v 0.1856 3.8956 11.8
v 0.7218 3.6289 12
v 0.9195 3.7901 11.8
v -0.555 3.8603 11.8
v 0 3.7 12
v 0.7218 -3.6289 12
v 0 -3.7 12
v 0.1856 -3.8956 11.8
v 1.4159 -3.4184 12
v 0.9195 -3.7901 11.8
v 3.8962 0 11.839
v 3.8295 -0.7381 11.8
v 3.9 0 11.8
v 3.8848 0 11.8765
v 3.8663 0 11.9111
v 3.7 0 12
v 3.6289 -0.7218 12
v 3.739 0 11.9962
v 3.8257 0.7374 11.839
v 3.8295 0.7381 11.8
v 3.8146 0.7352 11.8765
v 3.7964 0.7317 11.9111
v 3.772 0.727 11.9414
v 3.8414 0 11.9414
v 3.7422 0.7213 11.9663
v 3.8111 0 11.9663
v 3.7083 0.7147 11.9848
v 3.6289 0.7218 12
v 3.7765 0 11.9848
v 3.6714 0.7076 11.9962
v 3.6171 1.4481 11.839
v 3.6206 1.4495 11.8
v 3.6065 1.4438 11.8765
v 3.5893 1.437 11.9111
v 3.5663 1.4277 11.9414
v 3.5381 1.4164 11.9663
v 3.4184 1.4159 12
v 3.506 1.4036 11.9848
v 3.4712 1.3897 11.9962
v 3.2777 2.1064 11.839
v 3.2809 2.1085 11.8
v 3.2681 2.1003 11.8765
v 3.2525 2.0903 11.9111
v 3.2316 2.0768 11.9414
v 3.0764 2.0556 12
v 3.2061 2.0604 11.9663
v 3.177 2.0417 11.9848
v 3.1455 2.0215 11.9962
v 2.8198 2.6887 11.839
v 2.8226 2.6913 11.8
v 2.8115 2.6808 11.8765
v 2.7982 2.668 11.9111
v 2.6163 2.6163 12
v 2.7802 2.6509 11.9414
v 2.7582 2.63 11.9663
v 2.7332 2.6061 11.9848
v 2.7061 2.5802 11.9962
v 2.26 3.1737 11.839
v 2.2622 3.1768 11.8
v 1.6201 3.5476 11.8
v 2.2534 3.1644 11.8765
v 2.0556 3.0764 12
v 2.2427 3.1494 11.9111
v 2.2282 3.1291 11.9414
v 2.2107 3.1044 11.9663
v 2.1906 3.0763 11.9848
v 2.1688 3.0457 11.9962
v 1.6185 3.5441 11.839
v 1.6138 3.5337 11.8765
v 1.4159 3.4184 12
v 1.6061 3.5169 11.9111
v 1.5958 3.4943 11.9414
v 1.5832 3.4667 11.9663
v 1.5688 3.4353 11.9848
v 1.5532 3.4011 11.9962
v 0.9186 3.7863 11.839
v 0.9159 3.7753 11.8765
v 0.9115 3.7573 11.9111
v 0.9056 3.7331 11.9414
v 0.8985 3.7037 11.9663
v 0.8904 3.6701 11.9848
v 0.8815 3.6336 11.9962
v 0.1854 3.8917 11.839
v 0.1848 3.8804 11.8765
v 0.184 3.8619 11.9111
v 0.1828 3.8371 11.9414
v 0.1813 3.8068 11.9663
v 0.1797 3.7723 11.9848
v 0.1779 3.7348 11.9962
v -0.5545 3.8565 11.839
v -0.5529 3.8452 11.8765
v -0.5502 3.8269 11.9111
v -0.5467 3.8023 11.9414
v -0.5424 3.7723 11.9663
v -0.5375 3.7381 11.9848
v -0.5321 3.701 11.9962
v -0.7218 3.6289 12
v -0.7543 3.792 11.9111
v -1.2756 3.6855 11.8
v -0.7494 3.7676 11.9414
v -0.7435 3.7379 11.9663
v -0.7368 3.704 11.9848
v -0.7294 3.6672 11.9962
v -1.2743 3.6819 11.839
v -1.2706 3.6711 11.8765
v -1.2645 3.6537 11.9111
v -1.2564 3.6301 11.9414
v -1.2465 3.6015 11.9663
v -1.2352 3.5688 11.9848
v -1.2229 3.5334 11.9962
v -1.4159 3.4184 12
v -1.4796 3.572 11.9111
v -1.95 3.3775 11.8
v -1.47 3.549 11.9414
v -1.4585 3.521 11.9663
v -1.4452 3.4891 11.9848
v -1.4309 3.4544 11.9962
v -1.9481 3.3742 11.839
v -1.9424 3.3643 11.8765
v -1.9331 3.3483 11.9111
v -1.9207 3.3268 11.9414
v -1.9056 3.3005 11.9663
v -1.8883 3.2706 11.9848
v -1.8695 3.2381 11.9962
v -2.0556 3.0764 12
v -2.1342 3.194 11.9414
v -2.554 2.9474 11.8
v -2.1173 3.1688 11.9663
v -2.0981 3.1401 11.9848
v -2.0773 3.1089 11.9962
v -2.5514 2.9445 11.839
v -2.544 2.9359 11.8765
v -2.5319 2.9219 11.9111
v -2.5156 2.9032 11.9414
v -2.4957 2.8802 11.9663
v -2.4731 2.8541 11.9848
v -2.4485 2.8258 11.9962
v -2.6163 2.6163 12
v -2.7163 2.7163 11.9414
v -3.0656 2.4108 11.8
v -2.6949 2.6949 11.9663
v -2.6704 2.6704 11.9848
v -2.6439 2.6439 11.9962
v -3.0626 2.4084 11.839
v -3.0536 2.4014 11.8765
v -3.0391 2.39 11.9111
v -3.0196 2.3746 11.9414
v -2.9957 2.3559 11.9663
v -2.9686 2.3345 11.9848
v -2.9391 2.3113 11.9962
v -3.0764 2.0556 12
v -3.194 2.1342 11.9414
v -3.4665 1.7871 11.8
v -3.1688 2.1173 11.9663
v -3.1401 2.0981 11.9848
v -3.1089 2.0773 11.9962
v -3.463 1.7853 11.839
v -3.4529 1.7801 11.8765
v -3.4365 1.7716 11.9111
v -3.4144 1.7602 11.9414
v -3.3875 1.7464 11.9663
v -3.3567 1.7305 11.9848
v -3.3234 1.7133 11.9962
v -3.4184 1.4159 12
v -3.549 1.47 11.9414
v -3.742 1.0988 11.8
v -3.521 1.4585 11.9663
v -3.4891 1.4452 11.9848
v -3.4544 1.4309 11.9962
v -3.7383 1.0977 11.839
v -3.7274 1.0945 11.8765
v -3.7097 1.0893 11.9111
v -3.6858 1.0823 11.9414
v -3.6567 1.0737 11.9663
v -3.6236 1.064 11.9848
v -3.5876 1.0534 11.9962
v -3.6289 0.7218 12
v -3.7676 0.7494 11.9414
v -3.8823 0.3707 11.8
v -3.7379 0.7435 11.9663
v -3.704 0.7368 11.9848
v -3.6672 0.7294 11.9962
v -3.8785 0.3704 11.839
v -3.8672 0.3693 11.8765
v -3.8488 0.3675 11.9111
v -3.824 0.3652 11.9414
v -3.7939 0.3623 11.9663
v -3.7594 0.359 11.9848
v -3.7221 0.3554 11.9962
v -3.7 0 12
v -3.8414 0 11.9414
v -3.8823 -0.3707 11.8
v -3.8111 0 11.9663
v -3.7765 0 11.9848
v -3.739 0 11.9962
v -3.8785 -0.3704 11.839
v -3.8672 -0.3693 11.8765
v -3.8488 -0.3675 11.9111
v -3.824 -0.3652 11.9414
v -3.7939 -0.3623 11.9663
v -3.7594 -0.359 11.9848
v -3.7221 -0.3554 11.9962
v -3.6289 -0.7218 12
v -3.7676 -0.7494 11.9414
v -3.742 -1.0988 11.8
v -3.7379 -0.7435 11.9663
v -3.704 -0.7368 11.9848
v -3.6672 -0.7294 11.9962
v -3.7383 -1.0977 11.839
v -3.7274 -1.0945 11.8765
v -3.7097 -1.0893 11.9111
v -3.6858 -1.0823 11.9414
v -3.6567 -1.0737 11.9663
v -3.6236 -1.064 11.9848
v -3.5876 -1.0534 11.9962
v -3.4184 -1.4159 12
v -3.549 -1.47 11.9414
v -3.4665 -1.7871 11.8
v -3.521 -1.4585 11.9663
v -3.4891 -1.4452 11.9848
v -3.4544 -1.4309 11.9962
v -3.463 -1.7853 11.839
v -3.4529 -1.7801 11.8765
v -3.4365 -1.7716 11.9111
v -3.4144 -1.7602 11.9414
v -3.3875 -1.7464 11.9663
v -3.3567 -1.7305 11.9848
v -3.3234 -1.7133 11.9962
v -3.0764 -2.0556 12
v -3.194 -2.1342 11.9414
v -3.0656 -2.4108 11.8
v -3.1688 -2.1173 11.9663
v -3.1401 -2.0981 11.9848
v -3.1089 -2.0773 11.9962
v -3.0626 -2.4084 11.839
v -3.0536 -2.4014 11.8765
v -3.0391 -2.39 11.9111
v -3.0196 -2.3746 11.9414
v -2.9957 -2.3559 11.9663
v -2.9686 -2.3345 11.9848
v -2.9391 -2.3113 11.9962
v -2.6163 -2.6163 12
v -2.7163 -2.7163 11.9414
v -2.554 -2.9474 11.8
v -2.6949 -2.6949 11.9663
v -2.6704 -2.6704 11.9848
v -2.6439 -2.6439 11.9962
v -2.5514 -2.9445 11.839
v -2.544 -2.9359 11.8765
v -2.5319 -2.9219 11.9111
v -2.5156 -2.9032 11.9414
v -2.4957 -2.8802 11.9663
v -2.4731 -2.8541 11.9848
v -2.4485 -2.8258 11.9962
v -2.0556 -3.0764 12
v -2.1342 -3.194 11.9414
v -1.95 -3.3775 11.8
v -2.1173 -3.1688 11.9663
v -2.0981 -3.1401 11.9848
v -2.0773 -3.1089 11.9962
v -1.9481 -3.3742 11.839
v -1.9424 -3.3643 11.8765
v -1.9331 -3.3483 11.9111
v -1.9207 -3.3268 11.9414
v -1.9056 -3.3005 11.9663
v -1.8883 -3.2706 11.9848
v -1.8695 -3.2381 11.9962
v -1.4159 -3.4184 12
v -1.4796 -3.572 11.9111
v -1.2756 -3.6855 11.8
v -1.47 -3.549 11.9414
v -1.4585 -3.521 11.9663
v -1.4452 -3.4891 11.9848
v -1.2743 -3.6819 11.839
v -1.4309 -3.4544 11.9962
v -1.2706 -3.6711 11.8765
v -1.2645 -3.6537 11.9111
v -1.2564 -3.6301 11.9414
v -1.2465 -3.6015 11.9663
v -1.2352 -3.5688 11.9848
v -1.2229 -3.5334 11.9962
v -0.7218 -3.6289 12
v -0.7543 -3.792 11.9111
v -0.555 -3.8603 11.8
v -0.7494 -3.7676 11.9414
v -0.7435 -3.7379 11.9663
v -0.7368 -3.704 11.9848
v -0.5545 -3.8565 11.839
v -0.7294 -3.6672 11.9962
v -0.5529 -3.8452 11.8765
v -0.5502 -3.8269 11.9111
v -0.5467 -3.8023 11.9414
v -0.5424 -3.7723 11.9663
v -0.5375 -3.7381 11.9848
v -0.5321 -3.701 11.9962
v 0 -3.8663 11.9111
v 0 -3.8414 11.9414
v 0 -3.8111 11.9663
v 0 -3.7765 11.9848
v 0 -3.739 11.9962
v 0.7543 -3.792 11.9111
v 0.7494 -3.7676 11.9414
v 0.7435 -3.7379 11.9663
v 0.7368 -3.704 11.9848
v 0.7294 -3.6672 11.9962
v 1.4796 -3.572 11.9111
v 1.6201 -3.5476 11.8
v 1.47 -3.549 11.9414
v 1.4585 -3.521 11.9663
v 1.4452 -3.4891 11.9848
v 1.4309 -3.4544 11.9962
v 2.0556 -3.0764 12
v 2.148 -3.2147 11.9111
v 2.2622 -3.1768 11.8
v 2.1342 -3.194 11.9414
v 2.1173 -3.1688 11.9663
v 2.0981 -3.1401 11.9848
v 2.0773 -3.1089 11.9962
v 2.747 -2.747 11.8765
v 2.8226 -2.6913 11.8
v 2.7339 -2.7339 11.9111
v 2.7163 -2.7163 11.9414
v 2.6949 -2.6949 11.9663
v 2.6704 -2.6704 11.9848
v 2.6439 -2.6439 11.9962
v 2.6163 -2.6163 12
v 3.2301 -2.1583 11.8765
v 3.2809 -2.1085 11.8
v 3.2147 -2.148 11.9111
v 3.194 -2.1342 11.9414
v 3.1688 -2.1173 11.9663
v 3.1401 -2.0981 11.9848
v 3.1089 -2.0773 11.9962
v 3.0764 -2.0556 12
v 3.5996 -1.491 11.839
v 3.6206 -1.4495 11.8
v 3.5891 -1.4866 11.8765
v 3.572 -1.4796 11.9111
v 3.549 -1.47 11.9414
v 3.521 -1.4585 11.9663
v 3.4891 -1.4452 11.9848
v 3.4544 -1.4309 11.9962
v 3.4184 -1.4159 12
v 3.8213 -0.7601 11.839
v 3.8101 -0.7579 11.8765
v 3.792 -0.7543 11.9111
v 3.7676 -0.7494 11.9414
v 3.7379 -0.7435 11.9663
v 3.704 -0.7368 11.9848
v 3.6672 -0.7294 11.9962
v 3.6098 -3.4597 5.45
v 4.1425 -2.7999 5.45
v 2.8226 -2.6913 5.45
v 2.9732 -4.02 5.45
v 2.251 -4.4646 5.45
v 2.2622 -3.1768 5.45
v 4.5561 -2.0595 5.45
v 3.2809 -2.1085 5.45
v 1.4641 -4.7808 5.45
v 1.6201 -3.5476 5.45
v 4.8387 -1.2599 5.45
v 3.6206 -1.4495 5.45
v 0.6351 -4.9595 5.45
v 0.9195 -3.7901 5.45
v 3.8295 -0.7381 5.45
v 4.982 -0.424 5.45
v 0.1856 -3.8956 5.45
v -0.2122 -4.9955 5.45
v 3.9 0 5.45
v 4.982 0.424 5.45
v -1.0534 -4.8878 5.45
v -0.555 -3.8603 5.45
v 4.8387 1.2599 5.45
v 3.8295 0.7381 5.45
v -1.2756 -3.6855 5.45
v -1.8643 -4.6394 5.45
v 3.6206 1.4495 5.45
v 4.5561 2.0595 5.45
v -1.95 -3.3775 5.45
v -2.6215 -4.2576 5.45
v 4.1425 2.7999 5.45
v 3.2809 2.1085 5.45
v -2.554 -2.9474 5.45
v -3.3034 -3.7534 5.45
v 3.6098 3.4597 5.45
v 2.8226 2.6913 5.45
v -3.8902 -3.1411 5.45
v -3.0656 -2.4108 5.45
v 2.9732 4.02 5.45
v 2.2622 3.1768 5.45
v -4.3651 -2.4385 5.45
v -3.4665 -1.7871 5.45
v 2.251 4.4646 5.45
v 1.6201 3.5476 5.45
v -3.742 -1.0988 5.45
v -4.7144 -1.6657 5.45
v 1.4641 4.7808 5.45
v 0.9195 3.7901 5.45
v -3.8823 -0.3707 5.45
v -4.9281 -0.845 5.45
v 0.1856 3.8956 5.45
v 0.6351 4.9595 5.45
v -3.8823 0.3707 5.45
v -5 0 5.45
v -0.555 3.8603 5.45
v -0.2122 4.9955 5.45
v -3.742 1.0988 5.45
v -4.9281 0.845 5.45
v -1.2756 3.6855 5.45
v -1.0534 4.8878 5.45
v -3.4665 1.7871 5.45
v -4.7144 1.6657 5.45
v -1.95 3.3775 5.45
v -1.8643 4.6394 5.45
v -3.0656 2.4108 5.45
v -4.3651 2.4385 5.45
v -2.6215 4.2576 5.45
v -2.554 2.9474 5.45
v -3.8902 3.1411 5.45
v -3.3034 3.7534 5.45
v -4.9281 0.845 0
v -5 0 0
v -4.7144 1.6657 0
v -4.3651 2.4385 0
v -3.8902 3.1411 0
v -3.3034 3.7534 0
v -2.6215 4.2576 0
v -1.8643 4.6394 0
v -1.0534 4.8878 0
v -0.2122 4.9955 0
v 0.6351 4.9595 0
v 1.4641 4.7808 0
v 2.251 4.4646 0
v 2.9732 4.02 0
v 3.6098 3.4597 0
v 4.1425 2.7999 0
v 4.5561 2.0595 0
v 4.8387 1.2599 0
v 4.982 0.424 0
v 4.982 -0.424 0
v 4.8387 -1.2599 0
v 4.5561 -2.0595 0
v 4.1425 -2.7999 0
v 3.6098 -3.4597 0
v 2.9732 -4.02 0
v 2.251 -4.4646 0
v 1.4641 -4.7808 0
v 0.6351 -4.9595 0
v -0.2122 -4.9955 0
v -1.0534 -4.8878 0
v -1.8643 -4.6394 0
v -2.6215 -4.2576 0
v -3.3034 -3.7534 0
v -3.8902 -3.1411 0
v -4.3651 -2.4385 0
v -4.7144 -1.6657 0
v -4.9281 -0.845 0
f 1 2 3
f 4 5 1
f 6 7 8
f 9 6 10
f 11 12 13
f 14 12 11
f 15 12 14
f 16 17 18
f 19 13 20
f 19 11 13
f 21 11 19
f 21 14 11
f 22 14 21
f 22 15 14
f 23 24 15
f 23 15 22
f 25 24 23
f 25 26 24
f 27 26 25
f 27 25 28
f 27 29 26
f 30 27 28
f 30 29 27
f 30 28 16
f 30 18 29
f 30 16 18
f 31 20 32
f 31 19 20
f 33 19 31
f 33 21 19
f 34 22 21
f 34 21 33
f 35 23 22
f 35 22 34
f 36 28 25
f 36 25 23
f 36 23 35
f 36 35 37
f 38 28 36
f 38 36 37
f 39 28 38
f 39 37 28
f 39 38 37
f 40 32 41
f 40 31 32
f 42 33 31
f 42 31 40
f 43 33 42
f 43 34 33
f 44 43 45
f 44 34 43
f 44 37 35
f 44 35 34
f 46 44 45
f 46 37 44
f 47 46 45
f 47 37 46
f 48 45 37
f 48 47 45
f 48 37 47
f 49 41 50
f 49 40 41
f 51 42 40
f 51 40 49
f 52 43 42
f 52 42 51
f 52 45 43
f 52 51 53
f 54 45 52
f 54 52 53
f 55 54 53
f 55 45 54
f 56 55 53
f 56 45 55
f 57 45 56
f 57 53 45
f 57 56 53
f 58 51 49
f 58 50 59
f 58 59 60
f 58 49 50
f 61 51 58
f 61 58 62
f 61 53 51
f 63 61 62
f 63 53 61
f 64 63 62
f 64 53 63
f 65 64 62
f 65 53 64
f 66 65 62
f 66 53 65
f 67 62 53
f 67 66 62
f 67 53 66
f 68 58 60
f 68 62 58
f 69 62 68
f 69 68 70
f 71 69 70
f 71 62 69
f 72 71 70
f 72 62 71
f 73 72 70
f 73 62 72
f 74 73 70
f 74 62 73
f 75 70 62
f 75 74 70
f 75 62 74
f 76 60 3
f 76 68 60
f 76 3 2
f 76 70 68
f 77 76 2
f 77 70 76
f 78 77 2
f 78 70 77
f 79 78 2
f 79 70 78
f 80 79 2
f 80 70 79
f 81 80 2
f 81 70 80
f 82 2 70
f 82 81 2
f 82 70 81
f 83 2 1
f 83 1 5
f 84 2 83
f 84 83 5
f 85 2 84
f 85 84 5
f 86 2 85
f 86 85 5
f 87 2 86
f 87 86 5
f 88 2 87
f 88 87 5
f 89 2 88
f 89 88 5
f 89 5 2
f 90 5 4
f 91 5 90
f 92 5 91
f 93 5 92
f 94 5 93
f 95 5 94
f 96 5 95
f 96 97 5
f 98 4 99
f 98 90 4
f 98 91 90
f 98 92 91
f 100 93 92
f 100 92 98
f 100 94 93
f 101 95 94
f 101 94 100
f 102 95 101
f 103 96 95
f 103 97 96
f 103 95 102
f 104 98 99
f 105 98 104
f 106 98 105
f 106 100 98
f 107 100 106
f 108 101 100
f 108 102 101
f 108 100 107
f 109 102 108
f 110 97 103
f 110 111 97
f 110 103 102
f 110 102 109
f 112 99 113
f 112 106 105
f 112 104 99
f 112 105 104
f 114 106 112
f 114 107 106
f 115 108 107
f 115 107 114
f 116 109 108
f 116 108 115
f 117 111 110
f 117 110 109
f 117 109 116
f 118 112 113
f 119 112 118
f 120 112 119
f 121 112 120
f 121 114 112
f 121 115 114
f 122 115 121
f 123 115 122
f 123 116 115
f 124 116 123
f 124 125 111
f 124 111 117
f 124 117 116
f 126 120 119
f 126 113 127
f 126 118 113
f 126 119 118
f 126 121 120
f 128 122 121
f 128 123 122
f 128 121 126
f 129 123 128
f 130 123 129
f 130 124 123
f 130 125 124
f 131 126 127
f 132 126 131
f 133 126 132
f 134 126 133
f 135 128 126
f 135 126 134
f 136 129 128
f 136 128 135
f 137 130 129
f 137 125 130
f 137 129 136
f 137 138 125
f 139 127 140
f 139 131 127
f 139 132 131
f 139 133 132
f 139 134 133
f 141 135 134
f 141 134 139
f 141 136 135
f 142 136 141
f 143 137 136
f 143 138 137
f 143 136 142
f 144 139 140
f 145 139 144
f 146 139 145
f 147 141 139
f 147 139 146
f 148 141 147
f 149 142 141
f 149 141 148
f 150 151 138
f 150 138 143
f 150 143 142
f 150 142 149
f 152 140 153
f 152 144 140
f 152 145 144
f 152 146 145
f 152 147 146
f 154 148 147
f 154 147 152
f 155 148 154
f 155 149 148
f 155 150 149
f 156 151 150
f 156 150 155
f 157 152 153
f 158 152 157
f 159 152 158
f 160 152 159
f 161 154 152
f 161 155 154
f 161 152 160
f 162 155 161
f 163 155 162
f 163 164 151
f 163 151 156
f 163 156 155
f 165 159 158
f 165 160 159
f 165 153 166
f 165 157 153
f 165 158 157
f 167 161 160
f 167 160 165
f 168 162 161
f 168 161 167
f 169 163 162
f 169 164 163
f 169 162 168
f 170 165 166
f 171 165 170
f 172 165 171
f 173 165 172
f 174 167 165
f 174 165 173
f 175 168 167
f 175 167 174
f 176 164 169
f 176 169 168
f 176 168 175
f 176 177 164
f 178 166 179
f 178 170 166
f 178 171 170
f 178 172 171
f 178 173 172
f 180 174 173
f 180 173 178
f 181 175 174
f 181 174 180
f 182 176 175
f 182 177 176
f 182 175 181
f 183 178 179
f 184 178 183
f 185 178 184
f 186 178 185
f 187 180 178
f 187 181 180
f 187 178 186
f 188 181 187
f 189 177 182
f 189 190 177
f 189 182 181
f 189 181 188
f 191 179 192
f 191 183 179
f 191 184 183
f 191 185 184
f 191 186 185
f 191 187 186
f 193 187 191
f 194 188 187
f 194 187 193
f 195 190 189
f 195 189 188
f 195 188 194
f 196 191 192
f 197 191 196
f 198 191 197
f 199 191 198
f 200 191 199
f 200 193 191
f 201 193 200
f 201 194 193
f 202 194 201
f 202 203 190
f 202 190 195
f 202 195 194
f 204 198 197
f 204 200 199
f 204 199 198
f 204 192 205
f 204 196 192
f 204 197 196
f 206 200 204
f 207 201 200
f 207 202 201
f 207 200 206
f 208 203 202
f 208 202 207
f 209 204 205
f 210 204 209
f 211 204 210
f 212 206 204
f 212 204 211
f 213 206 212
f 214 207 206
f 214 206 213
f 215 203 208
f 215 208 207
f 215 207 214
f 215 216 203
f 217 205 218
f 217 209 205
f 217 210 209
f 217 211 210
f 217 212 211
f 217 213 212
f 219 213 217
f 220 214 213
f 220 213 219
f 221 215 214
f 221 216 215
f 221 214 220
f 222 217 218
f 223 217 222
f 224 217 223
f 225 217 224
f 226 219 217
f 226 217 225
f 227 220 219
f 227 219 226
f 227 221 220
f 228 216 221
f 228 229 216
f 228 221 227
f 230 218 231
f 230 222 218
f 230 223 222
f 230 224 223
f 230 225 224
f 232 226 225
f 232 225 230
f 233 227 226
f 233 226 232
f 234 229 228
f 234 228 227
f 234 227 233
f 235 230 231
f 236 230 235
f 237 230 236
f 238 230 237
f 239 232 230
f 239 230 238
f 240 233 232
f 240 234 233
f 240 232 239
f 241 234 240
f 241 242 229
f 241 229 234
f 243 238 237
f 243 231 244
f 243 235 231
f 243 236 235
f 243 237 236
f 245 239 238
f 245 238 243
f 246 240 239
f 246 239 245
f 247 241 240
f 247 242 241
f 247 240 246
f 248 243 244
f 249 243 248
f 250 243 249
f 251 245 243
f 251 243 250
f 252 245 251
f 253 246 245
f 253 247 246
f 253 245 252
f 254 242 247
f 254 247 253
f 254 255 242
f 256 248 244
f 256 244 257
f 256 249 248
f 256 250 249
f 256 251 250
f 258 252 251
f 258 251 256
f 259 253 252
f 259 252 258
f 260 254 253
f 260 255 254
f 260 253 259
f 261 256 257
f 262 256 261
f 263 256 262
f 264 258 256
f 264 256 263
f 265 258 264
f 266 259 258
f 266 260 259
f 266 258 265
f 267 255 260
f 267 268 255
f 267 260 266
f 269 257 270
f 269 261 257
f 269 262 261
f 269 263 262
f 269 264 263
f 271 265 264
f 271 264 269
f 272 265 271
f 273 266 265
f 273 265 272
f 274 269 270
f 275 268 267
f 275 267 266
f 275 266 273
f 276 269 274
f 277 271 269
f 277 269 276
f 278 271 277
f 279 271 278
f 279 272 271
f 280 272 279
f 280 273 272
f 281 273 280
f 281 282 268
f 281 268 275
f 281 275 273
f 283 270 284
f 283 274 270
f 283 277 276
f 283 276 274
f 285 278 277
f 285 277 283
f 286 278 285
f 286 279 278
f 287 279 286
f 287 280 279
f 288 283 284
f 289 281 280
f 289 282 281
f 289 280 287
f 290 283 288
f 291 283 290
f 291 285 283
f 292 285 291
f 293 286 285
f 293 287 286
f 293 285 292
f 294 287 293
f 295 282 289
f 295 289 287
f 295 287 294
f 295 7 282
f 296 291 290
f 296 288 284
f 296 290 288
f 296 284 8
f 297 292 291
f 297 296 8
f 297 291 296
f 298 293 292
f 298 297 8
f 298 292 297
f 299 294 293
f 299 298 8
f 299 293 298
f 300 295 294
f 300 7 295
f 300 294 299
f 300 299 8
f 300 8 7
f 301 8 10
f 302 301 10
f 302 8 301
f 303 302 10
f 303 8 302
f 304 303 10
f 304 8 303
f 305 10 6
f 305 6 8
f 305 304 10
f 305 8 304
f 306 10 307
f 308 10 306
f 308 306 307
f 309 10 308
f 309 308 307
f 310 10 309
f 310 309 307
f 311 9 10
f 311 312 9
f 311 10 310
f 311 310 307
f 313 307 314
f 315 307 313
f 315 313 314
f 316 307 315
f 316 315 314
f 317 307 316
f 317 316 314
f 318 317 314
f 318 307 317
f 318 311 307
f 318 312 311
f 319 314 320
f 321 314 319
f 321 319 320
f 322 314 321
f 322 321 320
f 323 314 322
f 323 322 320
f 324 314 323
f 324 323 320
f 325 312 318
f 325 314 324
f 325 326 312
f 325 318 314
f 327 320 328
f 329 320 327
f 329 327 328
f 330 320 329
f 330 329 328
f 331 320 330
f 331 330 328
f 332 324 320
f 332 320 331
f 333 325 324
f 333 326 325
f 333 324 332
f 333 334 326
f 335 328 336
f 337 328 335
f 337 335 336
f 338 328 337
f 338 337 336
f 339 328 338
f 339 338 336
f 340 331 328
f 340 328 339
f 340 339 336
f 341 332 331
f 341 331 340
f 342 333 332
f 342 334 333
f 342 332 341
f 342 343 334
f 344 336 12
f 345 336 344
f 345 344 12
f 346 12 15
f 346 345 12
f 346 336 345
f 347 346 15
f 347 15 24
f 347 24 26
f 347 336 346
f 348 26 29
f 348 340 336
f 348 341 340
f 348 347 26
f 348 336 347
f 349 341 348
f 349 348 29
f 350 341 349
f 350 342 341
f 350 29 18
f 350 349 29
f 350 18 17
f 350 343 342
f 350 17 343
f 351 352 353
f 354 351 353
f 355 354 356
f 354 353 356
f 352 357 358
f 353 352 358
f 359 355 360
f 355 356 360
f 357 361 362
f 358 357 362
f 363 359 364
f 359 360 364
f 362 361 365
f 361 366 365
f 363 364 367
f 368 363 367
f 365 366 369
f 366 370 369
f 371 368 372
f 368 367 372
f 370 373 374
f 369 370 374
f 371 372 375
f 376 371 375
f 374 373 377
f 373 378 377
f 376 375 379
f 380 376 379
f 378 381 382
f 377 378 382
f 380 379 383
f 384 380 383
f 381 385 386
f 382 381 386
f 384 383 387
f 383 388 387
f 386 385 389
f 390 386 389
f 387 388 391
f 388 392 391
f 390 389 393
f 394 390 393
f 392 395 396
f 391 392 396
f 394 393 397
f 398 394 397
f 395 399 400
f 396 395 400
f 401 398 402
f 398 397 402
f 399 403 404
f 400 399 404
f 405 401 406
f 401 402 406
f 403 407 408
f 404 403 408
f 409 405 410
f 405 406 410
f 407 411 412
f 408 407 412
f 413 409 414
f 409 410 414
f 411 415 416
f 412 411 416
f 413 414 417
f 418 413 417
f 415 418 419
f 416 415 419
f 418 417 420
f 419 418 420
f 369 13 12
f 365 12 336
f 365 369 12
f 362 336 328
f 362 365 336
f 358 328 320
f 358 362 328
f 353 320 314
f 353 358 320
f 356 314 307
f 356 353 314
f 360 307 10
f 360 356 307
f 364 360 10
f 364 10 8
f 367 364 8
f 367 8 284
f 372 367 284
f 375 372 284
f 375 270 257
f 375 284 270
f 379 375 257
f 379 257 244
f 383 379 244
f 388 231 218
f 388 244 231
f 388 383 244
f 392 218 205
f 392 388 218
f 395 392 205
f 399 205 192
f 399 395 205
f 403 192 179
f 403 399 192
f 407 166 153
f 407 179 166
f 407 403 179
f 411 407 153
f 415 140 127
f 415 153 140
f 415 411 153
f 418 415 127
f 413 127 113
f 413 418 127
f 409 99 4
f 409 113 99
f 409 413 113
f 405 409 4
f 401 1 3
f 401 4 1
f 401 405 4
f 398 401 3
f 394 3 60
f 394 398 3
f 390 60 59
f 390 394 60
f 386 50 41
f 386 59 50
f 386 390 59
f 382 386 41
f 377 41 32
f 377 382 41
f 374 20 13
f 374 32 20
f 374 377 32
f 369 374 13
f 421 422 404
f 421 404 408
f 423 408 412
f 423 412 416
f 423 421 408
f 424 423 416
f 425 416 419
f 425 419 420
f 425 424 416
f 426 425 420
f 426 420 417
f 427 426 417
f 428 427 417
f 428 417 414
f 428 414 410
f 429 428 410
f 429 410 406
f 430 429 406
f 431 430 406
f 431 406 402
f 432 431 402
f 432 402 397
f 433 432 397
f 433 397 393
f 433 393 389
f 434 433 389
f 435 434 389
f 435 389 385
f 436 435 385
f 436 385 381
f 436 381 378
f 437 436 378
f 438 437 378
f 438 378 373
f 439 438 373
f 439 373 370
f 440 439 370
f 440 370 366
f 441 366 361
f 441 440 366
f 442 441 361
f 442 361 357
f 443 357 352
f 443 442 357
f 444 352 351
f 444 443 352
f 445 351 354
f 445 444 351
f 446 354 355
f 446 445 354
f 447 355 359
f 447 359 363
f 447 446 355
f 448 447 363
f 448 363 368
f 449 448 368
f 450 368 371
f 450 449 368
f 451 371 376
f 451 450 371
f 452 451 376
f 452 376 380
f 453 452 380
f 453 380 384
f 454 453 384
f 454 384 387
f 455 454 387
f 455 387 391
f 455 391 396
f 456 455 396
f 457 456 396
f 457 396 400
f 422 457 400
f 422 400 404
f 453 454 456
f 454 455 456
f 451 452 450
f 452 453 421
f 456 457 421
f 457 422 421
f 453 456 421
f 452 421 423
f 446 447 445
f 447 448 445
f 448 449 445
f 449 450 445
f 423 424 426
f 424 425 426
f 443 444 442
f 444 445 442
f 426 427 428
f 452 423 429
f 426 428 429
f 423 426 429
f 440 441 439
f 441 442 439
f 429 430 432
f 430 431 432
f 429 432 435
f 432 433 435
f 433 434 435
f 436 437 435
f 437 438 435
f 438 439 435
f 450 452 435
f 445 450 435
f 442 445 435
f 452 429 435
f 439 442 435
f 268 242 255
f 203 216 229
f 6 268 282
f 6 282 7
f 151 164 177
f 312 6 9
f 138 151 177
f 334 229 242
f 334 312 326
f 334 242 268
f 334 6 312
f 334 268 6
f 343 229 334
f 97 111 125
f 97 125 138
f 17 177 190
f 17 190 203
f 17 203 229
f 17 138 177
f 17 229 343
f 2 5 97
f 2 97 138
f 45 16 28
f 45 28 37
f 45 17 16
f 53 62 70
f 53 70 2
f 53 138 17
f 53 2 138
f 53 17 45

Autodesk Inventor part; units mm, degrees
ref_plane "YZ Plane" through (0, 0, 0) normal (1, 0, 0) x (0, 1, 0)
ref_plane "XZ Plane" through (0, 0, 0) normal (0, 1, 0) x (-1, 0, 0)
ref_plane "XY Plane" through (0, 0, 0) normal (0, 0, 1) x (1, 0, 0)
sketch "Sketch1" plane through (0, 0, 0) normal (0, 0, 1) x (1, 0, 0)
  circle A0 centre (0, 0) radius 3.9
  dimension "d0" = 7.8
extrude "Extrusion1" add sketch "Sketch1" along normal blind 12
sketch "Sketch2" plane through (0, 0, 0) normal (0, 0, -1) x (-1, 0, 0)
  circle A0 centre (0, 0) radius 5
  dimension "d3" = 10
extrude "Extrusion2" add sketch "Sketch2" against normal blind 5.45
fillet "Fillet1" radius 0.2 1 edges at (-3.9, 0, 12)
properties part number "ResetButton"
